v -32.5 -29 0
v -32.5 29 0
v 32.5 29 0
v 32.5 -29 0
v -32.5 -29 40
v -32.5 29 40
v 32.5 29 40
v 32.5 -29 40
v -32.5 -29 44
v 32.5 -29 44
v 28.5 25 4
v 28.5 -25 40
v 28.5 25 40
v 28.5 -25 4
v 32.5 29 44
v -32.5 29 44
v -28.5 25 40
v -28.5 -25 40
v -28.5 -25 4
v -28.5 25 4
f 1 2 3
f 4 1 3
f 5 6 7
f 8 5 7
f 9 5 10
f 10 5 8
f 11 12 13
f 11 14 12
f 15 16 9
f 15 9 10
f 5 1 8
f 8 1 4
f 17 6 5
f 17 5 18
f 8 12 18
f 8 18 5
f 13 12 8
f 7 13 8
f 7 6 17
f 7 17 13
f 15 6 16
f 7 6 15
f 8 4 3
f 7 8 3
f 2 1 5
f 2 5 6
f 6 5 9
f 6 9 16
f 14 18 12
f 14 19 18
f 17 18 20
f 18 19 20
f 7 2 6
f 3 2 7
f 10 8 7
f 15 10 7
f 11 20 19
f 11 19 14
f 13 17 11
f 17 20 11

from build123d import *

# Parameters (mm, degrees)
F0_W     = 65
F0_H     = 58
F1_DEPTH = 40
F2_T     = -4
F3_W     = 65
F3_H     = 58
F4_DEPTH = 4


with BuildPart() as f1:
    # F0 (on Top) → F1 (new body)
    with BuildSketch(Plane.XY):
        Rectangle(F0_W, F0_H)
    extrude(amount=F1_DEPTH)

    # F2
    f2_openings = [f1.faces().sort_by_distance(p)[0] for p in [
        (0, 0, 40),
    ]]
    offset(amount=F2_T, openings=f2_openings)


with BuildPart() as f4:
    # F3 (on face) → F4 (new body)
    with BuildSketch(Plane.XY.offset(40)):
        Rectangle(F3_W, F3_H)
    extrude(amount=F4_DEPTH)


solid = Compound([f1.part, f4.part])
